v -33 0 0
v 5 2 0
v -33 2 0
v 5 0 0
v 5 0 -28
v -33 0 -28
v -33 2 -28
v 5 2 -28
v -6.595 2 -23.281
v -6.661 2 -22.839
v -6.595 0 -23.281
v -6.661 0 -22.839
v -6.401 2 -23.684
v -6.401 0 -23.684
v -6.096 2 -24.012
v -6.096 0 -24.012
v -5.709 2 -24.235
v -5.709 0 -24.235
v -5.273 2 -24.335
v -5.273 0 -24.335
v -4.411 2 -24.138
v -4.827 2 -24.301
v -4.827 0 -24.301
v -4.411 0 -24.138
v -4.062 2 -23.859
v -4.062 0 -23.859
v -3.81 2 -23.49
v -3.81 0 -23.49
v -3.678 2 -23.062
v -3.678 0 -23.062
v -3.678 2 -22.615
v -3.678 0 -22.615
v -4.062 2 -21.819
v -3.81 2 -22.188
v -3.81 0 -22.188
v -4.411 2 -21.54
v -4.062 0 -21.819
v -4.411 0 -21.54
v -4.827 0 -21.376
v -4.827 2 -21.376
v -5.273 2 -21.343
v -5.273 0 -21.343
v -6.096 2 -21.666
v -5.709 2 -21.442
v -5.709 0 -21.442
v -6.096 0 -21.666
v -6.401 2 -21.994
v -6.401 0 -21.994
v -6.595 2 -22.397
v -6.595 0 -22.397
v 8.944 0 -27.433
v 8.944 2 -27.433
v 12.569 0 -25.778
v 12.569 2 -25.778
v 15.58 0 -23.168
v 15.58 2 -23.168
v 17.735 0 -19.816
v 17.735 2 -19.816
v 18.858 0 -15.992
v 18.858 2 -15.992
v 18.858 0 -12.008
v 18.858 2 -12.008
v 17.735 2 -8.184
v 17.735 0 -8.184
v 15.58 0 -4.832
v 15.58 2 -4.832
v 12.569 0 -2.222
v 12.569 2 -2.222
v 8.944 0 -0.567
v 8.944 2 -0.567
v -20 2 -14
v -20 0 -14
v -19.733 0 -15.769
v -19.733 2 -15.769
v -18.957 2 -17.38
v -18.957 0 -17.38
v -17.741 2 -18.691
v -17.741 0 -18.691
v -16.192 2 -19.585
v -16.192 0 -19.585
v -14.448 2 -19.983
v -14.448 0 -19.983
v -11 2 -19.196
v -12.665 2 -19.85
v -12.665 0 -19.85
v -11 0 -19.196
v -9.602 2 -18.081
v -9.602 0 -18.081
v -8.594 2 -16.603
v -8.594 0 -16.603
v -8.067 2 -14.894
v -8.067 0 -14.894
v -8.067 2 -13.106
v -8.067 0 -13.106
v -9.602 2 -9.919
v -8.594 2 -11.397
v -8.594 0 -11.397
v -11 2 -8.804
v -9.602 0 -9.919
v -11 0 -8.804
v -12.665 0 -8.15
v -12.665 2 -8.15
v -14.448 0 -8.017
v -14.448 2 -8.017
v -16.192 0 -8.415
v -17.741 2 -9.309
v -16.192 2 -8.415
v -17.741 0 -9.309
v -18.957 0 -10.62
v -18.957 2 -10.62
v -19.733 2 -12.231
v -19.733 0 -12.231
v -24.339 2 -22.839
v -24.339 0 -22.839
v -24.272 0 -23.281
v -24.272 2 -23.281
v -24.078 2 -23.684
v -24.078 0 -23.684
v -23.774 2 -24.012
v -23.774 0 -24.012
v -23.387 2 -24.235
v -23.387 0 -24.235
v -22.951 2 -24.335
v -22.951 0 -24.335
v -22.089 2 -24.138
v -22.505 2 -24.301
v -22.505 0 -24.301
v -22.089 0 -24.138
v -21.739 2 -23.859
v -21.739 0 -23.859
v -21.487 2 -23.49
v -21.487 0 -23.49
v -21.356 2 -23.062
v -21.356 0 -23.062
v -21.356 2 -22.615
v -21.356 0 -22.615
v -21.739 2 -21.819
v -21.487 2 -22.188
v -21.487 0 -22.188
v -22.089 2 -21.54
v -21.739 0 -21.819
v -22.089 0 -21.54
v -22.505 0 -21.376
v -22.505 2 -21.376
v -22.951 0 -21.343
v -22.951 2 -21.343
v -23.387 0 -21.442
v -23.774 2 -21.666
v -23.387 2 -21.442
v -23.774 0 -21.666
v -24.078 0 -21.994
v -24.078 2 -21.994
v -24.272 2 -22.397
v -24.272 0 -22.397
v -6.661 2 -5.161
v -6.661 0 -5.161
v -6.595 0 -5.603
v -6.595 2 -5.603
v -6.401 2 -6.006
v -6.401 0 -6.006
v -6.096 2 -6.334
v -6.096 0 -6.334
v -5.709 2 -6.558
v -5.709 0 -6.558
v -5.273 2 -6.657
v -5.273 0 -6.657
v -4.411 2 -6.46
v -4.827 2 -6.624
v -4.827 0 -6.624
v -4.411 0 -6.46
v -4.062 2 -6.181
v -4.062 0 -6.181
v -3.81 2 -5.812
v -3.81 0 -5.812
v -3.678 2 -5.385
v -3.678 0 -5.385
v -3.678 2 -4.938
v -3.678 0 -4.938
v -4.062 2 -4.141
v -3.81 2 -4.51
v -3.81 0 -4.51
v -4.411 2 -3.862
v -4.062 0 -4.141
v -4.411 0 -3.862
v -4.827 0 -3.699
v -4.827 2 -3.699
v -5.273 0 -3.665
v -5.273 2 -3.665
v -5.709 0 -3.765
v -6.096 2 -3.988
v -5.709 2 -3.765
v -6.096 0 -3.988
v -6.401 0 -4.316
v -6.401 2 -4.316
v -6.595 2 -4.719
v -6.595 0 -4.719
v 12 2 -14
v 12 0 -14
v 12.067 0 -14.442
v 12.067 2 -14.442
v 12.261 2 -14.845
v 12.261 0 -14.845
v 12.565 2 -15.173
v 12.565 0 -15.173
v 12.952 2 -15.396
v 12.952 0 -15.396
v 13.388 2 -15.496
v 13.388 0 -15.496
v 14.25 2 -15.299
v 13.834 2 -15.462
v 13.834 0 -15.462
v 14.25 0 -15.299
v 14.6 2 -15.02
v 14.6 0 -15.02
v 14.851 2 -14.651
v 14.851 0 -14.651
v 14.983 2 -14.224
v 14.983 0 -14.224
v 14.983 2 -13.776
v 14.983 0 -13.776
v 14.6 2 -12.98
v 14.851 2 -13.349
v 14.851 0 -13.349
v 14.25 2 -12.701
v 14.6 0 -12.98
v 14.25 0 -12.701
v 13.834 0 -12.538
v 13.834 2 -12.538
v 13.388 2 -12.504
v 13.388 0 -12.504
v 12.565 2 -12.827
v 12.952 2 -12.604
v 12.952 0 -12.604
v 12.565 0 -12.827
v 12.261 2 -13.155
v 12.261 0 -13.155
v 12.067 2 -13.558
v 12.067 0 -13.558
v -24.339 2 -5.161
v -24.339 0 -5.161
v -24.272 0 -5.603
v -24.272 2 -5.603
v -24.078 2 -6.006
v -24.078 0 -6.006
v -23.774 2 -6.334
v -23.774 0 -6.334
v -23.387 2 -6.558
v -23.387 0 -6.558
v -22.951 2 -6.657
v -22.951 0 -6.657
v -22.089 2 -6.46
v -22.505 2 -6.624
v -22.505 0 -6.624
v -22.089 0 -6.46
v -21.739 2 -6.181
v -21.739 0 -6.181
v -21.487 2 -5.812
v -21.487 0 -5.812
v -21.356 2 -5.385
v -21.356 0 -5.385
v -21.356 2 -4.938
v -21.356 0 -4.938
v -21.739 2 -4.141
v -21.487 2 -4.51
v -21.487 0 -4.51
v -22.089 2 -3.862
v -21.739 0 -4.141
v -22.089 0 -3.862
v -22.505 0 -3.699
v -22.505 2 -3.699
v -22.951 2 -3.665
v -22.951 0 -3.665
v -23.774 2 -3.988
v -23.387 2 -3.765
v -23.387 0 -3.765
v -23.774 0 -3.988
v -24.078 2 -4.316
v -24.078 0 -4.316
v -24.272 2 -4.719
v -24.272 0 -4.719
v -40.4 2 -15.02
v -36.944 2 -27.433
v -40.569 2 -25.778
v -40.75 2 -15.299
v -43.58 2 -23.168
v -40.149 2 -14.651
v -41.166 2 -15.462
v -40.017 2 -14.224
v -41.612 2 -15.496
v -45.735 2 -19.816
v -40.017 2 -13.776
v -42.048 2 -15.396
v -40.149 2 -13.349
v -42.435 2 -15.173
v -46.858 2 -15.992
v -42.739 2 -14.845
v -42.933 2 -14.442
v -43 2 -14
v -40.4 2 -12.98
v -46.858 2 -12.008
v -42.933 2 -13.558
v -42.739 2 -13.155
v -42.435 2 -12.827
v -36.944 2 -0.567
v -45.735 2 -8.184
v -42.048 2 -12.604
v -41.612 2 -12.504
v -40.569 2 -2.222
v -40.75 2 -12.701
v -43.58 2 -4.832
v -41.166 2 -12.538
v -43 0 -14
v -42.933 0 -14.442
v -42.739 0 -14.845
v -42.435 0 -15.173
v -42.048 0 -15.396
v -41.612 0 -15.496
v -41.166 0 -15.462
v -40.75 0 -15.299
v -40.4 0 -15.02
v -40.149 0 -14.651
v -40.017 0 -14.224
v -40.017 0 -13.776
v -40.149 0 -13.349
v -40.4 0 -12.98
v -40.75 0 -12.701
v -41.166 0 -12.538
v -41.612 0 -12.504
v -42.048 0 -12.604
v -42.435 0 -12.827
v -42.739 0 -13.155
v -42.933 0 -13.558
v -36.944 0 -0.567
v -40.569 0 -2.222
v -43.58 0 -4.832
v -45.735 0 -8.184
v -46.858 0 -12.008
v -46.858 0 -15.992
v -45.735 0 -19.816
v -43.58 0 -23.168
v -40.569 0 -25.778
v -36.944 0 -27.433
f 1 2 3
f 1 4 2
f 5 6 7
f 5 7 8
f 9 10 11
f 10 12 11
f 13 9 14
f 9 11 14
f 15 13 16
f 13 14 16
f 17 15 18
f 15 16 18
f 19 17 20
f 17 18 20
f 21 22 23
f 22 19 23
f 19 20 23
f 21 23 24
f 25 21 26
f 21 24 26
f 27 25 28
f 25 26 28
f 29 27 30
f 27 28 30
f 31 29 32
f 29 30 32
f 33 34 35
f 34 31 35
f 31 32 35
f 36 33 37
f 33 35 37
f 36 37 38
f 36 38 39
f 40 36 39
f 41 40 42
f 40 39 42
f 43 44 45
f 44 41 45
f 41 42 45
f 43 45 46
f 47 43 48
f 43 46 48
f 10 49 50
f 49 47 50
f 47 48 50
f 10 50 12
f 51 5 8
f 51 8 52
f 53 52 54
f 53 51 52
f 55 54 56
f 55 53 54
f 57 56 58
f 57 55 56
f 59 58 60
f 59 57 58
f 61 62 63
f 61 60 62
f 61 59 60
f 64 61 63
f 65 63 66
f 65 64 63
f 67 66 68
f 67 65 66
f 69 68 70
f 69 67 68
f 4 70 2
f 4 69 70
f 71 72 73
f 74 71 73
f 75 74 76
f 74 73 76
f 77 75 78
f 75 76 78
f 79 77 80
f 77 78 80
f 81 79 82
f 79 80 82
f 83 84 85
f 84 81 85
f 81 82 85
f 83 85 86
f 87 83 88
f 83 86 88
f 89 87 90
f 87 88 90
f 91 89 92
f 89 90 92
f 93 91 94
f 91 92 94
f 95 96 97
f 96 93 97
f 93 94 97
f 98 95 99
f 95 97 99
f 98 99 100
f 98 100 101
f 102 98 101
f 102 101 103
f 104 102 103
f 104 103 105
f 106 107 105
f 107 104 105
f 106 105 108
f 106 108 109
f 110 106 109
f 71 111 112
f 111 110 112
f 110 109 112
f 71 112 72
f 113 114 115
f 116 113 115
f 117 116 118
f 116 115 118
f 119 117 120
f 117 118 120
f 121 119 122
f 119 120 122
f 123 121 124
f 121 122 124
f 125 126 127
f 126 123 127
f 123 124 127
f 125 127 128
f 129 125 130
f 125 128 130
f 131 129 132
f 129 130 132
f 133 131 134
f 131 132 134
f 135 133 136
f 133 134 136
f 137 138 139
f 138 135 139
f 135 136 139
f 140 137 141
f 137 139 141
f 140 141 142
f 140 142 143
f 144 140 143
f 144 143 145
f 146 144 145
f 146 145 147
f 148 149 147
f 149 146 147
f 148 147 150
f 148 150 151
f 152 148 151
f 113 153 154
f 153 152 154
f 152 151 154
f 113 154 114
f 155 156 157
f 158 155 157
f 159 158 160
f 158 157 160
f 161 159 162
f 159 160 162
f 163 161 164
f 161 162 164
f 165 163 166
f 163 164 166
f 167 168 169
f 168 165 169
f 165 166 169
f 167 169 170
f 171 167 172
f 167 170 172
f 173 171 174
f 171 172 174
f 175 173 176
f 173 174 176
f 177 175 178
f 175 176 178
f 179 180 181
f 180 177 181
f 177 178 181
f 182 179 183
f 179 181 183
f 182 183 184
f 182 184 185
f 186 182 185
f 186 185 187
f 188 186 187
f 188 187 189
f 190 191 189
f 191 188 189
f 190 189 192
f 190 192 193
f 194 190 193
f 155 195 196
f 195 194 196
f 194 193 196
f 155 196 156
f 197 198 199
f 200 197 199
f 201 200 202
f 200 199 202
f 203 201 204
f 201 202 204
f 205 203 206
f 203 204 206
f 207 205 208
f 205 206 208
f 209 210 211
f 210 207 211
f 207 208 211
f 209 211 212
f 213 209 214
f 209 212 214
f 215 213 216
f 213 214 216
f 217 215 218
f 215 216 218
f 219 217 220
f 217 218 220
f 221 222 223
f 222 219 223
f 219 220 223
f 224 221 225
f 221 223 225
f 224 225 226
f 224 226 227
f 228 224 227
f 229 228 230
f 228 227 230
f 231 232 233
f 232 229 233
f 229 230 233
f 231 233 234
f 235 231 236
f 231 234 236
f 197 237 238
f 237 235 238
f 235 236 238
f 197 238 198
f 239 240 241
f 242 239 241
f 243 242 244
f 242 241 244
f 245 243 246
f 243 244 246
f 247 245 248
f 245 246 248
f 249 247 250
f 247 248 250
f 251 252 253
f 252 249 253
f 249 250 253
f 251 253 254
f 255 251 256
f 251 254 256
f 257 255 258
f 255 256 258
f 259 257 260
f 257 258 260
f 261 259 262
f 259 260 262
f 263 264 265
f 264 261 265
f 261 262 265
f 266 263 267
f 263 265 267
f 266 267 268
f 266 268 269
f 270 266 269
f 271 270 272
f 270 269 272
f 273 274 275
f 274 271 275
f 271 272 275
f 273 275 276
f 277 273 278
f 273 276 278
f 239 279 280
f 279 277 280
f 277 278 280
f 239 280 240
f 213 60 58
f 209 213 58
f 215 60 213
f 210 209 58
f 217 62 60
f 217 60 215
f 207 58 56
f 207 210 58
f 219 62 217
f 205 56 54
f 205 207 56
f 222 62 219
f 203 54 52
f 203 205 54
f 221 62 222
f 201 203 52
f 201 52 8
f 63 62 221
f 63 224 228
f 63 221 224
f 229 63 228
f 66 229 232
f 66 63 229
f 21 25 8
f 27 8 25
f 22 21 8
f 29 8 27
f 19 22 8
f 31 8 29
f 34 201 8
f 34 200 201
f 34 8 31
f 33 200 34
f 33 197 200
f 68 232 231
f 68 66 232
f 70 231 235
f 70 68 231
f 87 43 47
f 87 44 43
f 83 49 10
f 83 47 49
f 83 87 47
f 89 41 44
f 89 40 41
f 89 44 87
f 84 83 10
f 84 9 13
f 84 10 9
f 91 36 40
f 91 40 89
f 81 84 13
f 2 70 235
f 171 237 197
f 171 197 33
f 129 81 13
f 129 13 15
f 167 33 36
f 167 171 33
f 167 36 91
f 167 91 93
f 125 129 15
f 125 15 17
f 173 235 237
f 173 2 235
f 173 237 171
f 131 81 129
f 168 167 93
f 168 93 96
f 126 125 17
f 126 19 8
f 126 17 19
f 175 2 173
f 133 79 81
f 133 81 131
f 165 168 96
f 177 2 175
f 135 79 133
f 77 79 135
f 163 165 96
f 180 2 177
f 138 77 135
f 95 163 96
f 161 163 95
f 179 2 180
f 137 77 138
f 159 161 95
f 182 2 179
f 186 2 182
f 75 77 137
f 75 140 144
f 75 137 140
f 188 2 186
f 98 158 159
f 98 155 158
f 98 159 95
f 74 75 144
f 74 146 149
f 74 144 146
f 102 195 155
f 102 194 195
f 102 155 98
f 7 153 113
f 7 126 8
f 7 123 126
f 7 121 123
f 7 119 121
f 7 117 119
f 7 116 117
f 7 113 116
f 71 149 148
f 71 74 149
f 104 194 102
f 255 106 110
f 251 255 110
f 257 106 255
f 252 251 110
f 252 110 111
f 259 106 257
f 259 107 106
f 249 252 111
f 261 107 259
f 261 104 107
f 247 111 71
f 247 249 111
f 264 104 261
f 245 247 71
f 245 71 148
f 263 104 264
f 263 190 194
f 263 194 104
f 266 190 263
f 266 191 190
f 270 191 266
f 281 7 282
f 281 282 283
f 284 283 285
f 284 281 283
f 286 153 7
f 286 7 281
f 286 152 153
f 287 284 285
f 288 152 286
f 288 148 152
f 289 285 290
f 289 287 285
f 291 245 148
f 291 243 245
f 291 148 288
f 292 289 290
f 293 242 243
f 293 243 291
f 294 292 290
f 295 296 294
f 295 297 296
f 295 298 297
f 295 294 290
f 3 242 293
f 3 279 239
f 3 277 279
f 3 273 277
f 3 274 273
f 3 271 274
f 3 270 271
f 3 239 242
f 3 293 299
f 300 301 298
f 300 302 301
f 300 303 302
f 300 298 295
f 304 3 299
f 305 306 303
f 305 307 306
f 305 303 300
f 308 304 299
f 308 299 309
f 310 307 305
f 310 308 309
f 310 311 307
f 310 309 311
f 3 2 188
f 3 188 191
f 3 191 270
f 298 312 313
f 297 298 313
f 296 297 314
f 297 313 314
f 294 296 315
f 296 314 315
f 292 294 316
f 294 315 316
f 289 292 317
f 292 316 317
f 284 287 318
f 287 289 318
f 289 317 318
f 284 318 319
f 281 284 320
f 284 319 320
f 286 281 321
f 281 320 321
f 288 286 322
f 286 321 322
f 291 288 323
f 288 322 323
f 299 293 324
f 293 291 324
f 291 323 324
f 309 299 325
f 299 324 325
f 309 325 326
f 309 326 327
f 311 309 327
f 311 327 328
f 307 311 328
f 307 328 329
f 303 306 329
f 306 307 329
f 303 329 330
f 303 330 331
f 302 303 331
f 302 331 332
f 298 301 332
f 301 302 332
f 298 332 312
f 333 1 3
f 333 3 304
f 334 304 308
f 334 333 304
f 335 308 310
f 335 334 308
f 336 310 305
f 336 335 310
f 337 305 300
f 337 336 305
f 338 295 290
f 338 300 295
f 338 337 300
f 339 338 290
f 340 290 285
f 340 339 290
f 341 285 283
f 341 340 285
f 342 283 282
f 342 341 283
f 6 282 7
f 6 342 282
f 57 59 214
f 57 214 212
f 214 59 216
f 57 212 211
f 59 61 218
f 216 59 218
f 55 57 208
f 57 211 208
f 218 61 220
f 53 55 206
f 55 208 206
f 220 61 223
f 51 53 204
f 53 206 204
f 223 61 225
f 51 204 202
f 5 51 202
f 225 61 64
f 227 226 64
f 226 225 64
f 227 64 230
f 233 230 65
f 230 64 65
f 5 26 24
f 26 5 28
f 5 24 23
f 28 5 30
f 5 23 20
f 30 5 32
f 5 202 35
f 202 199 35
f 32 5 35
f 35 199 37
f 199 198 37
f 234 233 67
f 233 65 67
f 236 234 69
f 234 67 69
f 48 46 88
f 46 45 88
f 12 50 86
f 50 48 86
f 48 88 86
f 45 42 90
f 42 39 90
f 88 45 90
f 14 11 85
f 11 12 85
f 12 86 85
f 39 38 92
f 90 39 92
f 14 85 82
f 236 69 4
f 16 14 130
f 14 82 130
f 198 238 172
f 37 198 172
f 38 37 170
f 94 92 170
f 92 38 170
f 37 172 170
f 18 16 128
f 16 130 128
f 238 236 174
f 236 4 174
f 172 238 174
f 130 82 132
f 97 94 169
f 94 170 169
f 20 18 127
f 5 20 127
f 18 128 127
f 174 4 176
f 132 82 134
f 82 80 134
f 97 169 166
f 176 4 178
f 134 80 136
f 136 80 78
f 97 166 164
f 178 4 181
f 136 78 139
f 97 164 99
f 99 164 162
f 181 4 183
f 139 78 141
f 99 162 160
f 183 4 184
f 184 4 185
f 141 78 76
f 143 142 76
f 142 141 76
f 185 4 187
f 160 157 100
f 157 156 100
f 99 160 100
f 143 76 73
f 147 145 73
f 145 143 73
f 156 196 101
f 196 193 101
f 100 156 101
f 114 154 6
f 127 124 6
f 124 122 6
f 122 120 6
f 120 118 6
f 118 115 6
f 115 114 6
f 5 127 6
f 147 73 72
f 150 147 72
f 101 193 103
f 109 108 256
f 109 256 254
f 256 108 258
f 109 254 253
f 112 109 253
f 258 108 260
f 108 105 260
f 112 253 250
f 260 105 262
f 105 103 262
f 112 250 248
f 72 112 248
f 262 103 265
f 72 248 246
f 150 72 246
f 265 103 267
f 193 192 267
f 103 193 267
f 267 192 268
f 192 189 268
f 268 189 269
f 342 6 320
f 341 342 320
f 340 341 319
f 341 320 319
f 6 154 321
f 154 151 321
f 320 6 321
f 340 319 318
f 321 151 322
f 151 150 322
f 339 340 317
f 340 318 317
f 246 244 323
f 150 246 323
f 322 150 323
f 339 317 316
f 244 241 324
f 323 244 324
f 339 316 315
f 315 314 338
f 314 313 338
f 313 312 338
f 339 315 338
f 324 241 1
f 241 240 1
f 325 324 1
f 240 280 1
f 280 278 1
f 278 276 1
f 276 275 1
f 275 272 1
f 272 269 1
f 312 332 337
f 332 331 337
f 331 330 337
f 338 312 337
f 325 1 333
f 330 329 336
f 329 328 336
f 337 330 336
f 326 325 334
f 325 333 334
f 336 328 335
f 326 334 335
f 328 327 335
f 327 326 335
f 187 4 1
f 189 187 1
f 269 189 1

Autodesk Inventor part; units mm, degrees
ref_plane "YZ Plane" through (0, 0, 0) normal (1, 0, 0) x (0, 1, 0)
ref_plane "XZ Plane" through (0, 0, 0) normal (0, 1, 0) x (-1, 0, 0)
ref_plane "XY Plane" through (0, 0, 0) normal (0, 0, 1) x (1, 0, 0)
sketch "Sketch2" plane through (0, 0, 0) normal (0, 1, 0) x (-1, 0, 0)
  line L0 (0, 0) -> (28, 0)
  line L1 (28, 0) -> (28, -28)
  line L2 (28, -28) -> (0, -28)
  line L3 (0, -28) -> (0, 0)
  line L4 (28, 0) -> (0, -28) construction
  line L5 (28, -28) -> (0, 0) construction
  circle A0 centre (22.8388, -5.1612) radius 1.5
  circle A1 centre (22.8388, -22.8388) radius 1.5
  circle A2 centre (5.1612, -5.1612) radius 1.5
  circle A3 centre (5.1612, -22.8388) radius 1.5
  circle A4 centre (14, -14) radius 6
  line L6 (28, -28) -> (33, -28)
  line L7 (33, -28) -> (33, 0)
  line L8 (33, 0) -> (28, 0)
  line L9 (28, 0) -> (28, -28)
  line L10 (0, -28) -> (-5, -28)
  line L11 (-5, -28) -> (-5, 0)
  line L12 (-5, 0) -> (0, 0)
  line L13 (0, 0) -> (0, -28)
  arc A5 (33, -28) -> (33, 0) centre (33, -14) ccw
  arc A6 (-5, 0) -> (-5, -28) centre (-5, -14) ccw
  circle A7 centre (41.5, -14) radius 1.5
  circle A8 centre (-13.5, -14) radius 1.5
  dimension "d37" = 3
  dimension "d38" = 3
  dimension "d39" = 3
  dimension "d40" = 3
  dimension "d41" = 12.5
  dimension "d42" = 12.5
  dimension "d43" = 12.5
  dimension "d44" = 12.5
  dimension "d60" = 28
  dimension "d61" = 12
  dimension "d66" = 5
  dimension "d67" = 5
  dimension "d68" = 3
  dimension "d69" = 3
  dimension "d70" = 8.5
  dimension "d71" = 8.5
extrude "Extrusion2" add sketch "Sketch2" along normal blind 2
sketch "Sketch3" plane through (0, 2, 0) normal (0, 1, 0) x (1, 0, 0)
  line L0 (5, 28) -> (-33, 28) projected
  arc A0 (-33, 28) -> (-33, 0) centre (-33, 14) ccw projected
  line L1 (-33, 0) -> (5, 0) projected
  arc A1 (5, 0) -> (5, 28) centre (5, 14) ccw projected
  circle A2 centre (-22.8388, 22.8388) radius 1.5 projected
  circle A3 centre (-5.1612, 5.1612) radius 1.5 projected
  circle A4 centre (-14, 14) radius 6 projected
  circle A5 centre (-5.1612, 22.8388) radius 1.5 projected
  circle A6 centre (-22.8388, 5.1612) radius 1.5 projected
  circle A7 centre (-41.5, 14) radius 1.5 projected
  circle A8 centre (13.5, 14) radius 1.5 projected
  point P0 (0, 0)
properties part number "Motor_mount_plate_large"
